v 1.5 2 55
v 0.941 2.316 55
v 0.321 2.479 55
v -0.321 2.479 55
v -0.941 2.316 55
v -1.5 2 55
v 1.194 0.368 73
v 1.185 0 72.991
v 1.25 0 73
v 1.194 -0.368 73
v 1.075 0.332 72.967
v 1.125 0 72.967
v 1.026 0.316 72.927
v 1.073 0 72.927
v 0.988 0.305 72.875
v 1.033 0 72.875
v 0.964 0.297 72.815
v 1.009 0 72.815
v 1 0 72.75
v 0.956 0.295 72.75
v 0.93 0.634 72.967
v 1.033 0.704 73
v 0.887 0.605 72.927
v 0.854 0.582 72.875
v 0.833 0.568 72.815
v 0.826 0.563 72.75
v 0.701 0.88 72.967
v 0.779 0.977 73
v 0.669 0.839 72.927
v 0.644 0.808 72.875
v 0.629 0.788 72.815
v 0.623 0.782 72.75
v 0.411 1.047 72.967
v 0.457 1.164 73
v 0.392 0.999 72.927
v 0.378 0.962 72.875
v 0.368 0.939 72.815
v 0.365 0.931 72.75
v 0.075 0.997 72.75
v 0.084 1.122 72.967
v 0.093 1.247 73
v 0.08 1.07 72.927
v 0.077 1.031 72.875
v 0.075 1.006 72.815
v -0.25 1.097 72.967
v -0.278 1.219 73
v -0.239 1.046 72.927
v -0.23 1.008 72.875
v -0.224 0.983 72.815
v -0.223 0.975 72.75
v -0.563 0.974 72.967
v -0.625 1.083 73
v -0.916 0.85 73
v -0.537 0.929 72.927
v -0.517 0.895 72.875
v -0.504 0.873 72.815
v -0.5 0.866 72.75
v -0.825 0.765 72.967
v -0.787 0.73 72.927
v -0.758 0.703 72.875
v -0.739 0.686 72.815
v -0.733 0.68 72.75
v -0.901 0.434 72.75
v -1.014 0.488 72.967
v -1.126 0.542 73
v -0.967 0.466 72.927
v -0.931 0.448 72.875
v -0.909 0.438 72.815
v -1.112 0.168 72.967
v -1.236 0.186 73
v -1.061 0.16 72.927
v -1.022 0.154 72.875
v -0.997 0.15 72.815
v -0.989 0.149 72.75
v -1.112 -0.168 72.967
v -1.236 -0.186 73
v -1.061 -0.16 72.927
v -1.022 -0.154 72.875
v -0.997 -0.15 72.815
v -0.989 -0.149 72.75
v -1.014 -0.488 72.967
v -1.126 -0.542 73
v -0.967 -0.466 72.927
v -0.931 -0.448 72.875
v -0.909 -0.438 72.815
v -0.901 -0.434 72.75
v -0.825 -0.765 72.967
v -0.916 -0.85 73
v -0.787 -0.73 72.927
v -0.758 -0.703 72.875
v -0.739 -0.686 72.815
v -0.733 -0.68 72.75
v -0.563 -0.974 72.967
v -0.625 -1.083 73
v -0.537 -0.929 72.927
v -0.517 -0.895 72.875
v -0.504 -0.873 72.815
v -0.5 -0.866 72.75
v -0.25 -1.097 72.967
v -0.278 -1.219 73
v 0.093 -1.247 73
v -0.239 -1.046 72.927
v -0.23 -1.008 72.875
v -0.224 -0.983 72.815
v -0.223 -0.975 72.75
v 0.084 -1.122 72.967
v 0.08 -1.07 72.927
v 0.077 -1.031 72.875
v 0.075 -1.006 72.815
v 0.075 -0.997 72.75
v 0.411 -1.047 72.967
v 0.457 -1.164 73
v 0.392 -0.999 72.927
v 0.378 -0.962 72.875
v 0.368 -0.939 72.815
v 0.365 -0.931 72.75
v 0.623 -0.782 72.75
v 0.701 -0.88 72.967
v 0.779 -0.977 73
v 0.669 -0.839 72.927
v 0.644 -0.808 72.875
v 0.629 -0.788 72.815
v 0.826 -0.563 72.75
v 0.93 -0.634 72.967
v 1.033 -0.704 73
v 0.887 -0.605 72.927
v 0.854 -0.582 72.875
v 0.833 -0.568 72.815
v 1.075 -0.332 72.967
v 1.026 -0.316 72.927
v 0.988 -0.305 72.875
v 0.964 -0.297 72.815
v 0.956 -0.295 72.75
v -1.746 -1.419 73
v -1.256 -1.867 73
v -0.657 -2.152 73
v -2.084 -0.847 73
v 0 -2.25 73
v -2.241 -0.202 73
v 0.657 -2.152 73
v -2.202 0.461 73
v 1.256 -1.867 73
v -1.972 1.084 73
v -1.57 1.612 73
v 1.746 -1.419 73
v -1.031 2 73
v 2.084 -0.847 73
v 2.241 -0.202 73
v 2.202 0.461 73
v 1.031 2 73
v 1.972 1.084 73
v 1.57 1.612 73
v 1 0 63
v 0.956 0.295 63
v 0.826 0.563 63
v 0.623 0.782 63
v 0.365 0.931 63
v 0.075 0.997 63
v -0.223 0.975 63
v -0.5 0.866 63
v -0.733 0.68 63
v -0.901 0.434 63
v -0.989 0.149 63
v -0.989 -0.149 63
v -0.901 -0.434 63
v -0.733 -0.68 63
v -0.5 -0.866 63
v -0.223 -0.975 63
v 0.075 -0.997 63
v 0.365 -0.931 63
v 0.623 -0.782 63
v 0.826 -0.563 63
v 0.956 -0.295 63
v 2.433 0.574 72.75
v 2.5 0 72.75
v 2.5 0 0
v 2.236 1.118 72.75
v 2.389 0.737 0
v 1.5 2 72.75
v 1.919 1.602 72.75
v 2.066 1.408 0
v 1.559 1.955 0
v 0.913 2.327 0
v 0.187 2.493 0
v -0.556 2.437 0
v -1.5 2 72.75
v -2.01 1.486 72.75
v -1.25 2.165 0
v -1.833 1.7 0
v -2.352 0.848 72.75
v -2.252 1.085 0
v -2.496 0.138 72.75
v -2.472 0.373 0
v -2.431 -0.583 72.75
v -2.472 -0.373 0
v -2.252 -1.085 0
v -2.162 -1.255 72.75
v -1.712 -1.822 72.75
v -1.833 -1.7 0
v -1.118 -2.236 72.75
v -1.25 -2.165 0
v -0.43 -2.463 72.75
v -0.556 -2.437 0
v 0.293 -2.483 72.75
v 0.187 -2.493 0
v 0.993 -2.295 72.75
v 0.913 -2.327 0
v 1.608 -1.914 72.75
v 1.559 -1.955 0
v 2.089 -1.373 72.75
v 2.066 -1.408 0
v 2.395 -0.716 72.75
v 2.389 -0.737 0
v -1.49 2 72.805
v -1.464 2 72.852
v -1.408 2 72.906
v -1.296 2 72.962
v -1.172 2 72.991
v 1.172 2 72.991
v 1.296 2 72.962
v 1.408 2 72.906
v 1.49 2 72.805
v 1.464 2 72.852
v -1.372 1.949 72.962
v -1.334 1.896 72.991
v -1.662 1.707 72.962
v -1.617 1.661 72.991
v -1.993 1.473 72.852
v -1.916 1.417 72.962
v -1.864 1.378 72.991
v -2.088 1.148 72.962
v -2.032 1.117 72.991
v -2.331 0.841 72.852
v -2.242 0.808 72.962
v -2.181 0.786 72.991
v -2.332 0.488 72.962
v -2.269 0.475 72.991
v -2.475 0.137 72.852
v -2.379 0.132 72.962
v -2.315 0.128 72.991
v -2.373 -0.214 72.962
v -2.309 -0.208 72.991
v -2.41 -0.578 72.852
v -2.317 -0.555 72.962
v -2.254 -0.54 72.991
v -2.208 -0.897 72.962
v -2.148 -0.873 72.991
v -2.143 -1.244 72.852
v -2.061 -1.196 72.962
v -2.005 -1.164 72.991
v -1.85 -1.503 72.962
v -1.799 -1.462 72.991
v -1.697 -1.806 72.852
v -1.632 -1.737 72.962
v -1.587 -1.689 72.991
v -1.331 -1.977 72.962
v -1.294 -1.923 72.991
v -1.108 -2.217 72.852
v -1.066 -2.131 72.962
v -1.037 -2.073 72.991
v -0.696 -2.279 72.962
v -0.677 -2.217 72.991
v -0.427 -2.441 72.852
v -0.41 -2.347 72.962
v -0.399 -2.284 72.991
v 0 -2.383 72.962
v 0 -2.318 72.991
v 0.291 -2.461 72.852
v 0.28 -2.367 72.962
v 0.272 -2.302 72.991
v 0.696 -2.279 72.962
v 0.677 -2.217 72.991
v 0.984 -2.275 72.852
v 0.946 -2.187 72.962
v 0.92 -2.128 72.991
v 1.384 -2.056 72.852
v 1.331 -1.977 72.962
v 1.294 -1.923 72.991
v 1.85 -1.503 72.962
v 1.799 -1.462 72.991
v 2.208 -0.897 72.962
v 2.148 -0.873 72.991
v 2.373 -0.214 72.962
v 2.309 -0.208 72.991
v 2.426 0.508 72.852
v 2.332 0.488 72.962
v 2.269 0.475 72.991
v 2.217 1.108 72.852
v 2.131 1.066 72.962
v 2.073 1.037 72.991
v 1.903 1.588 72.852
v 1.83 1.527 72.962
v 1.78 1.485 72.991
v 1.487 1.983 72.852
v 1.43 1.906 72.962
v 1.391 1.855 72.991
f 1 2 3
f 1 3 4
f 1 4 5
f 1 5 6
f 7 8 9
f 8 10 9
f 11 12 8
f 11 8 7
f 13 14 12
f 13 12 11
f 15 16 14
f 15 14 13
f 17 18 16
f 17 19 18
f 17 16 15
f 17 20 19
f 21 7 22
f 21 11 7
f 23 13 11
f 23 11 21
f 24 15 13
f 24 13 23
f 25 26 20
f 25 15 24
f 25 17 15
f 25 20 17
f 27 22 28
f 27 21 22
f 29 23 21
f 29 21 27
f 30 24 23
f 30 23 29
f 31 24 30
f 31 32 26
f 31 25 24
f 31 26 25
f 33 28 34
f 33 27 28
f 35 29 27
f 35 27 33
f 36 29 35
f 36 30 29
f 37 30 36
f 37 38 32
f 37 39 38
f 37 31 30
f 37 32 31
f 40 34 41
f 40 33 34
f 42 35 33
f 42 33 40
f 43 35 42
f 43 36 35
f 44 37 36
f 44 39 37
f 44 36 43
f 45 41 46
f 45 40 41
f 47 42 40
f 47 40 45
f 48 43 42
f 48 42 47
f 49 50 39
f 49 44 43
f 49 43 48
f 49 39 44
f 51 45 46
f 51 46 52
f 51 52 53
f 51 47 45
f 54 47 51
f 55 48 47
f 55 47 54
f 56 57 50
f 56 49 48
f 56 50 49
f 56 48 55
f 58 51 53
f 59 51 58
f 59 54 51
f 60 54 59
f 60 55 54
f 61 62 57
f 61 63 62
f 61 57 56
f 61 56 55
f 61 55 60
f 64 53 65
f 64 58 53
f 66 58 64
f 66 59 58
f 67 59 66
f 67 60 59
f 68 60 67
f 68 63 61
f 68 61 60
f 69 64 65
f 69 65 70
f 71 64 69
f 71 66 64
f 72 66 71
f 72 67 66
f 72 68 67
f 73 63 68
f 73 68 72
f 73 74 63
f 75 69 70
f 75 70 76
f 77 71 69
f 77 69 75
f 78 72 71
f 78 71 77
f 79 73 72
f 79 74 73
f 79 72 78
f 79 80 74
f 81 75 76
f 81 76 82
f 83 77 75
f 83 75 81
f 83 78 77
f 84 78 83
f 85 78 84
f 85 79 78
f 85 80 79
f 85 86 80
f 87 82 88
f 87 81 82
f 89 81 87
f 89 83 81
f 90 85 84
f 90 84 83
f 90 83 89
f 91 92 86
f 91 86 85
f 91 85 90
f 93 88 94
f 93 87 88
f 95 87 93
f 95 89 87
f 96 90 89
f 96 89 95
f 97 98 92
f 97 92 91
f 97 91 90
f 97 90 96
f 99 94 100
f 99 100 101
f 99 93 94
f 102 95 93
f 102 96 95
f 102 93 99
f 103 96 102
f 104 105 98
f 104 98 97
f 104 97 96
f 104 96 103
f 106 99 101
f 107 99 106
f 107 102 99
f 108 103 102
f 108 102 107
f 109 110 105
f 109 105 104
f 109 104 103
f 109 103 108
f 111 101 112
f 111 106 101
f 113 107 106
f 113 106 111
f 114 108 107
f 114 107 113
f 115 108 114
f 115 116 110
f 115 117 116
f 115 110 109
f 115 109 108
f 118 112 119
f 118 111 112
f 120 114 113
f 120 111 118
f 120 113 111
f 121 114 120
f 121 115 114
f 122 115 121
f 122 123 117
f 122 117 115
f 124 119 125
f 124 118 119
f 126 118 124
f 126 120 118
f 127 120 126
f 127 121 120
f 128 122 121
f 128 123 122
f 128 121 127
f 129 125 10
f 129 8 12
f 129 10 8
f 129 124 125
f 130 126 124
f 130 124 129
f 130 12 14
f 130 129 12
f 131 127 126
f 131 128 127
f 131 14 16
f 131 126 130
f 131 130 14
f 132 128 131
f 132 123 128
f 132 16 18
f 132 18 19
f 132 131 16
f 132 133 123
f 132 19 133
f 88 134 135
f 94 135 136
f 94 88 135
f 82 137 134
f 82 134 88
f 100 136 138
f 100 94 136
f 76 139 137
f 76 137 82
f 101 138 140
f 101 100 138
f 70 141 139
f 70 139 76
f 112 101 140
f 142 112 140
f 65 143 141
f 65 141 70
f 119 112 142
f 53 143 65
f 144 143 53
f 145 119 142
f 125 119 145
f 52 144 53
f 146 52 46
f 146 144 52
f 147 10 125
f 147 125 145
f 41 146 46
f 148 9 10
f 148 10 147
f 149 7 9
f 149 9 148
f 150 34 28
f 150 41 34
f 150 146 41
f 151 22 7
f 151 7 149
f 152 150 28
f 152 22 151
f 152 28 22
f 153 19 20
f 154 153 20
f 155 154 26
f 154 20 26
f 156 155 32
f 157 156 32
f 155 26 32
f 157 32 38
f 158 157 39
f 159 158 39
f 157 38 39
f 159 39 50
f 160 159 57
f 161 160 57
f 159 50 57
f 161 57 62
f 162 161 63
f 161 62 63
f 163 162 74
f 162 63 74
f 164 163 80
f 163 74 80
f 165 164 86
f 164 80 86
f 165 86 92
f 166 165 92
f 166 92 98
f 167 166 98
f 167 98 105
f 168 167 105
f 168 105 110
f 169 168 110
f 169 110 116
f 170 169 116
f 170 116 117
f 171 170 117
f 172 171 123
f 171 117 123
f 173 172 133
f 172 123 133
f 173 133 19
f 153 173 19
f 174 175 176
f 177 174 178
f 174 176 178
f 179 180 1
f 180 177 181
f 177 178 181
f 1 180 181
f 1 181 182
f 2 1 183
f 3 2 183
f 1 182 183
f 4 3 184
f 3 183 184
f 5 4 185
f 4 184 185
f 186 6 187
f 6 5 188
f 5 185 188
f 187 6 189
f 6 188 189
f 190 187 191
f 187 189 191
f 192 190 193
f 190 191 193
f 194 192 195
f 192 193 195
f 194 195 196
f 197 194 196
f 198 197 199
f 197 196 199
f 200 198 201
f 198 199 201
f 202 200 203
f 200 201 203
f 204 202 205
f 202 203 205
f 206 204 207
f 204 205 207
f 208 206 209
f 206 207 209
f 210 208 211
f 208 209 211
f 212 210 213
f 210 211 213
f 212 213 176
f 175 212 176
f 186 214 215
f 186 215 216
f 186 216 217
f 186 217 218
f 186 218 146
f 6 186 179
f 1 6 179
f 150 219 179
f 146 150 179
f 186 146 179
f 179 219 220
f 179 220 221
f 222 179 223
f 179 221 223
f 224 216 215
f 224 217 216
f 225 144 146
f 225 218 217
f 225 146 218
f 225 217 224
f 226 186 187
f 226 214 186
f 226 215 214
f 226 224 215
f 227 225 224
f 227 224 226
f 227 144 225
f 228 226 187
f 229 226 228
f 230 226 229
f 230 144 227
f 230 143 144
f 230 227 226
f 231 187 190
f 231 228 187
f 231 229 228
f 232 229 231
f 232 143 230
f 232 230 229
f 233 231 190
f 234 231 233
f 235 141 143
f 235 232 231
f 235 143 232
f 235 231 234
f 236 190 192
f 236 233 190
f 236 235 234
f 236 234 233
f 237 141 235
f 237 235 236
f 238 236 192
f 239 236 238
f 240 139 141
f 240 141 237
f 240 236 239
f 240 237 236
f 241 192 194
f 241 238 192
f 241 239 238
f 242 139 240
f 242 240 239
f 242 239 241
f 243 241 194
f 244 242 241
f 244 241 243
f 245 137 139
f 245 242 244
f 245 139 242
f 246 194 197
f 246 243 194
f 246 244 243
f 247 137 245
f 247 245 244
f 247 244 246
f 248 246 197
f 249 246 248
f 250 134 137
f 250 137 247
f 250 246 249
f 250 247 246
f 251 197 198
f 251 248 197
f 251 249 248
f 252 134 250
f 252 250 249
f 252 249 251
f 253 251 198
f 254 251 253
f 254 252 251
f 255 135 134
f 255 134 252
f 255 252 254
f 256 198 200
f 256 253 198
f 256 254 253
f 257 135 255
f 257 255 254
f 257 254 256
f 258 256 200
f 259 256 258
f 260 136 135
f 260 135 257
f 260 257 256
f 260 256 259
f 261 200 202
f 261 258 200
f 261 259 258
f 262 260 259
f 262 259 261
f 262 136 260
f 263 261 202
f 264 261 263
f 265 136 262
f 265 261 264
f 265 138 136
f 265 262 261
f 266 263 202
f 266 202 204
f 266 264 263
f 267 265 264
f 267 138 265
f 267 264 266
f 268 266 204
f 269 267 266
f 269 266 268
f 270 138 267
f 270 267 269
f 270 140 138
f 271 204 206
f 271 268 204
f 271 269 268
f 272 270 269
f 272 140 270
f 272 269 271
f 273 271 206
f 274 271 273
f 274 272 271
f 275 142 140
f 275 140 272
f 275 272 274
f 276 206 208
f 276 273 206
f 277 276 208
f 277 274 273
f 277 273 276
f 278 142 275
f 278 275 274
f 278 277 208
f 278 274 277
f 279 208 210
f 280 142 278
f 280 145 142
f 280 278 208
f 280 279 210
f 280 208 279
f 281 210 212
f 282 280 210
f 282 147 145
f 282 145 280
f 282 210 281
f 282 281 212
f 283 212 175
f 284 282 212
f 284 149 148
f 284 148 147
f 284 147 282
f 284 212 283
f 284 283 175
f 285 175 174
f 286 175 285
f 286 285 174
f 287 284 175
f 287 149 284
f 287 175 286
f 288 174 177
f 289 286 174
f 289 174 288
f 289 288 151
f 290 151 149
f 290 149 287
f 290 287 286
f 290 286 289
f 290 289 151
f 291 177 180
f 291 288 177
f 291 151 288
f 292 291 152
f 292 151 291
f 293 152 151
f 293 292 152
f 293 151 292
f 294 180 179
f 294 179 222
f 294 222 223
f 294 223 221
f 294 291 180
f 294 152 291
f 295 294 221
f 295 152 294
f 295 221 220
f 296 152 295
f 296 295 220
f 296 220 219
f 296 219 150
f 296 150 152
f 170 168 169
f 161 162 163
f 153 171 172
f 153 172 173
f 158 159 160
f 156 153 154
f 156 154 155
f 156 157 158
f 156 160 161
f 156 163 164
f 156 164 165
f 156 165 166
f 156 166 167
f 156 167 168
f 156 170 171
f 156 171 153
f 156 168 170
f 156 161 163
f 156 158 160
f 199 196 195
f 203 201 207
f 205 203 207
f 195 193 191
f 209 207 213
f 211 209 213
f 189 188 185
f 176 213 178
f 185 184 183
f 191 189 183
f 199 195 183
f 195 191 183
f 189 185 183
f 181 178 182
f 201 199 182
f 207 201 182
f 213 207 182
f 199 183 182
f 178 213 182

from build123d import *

# Parameters (mm, degrees)
SKETCH1_R          = 2.5
EXTRUDE1_DEPTH     = 73
SKETCH2_R          = 1
ICE1_DEPTH         = 10
FILLET1_R          = 0.25
CUT_EXTRUDE1_DEPTH = 18


with BuildPart() as part:
    # Sketch1 → Extrude1 (new body)
    with BuildSketch(Plane.XY):
        Circle(SKETCH1_R)
    extrude(amount=EXTRUDE1_DEPTH)

    # Sketch2 → ICE1 (cut)
    with BuildSketch(Plane.XY.offset(73)):
        Circle(SKETCH2_R)
    extrude(amount=-ICE1_DEPTH, mode=Mode.SUBTRACT)

    # Fillet1
    fillet1_edges = [part.edges().sort_by_distance(p)[0] for p in [
        (-2.5, 0, 73),
        (-1, 0, 73),
    ]]
    fillet(fillet1_edges, radius=FILLET1_R)

    # Sketch4 → Cut-Extrude1 (cut)
    with BuildSketch(Plane.XY.offset(73)):
        with BuildLine():
            Line((-1.5, 2), (1.5, 2))
            ThreePointArc((1.5, 2), (0, 2.5), (-1.5, 2))
        make_face()
    extrude(amount=-CUT_EXTRUDE1_DEPTH, mode=Mode.SUBTRACT)


solid = part.part
